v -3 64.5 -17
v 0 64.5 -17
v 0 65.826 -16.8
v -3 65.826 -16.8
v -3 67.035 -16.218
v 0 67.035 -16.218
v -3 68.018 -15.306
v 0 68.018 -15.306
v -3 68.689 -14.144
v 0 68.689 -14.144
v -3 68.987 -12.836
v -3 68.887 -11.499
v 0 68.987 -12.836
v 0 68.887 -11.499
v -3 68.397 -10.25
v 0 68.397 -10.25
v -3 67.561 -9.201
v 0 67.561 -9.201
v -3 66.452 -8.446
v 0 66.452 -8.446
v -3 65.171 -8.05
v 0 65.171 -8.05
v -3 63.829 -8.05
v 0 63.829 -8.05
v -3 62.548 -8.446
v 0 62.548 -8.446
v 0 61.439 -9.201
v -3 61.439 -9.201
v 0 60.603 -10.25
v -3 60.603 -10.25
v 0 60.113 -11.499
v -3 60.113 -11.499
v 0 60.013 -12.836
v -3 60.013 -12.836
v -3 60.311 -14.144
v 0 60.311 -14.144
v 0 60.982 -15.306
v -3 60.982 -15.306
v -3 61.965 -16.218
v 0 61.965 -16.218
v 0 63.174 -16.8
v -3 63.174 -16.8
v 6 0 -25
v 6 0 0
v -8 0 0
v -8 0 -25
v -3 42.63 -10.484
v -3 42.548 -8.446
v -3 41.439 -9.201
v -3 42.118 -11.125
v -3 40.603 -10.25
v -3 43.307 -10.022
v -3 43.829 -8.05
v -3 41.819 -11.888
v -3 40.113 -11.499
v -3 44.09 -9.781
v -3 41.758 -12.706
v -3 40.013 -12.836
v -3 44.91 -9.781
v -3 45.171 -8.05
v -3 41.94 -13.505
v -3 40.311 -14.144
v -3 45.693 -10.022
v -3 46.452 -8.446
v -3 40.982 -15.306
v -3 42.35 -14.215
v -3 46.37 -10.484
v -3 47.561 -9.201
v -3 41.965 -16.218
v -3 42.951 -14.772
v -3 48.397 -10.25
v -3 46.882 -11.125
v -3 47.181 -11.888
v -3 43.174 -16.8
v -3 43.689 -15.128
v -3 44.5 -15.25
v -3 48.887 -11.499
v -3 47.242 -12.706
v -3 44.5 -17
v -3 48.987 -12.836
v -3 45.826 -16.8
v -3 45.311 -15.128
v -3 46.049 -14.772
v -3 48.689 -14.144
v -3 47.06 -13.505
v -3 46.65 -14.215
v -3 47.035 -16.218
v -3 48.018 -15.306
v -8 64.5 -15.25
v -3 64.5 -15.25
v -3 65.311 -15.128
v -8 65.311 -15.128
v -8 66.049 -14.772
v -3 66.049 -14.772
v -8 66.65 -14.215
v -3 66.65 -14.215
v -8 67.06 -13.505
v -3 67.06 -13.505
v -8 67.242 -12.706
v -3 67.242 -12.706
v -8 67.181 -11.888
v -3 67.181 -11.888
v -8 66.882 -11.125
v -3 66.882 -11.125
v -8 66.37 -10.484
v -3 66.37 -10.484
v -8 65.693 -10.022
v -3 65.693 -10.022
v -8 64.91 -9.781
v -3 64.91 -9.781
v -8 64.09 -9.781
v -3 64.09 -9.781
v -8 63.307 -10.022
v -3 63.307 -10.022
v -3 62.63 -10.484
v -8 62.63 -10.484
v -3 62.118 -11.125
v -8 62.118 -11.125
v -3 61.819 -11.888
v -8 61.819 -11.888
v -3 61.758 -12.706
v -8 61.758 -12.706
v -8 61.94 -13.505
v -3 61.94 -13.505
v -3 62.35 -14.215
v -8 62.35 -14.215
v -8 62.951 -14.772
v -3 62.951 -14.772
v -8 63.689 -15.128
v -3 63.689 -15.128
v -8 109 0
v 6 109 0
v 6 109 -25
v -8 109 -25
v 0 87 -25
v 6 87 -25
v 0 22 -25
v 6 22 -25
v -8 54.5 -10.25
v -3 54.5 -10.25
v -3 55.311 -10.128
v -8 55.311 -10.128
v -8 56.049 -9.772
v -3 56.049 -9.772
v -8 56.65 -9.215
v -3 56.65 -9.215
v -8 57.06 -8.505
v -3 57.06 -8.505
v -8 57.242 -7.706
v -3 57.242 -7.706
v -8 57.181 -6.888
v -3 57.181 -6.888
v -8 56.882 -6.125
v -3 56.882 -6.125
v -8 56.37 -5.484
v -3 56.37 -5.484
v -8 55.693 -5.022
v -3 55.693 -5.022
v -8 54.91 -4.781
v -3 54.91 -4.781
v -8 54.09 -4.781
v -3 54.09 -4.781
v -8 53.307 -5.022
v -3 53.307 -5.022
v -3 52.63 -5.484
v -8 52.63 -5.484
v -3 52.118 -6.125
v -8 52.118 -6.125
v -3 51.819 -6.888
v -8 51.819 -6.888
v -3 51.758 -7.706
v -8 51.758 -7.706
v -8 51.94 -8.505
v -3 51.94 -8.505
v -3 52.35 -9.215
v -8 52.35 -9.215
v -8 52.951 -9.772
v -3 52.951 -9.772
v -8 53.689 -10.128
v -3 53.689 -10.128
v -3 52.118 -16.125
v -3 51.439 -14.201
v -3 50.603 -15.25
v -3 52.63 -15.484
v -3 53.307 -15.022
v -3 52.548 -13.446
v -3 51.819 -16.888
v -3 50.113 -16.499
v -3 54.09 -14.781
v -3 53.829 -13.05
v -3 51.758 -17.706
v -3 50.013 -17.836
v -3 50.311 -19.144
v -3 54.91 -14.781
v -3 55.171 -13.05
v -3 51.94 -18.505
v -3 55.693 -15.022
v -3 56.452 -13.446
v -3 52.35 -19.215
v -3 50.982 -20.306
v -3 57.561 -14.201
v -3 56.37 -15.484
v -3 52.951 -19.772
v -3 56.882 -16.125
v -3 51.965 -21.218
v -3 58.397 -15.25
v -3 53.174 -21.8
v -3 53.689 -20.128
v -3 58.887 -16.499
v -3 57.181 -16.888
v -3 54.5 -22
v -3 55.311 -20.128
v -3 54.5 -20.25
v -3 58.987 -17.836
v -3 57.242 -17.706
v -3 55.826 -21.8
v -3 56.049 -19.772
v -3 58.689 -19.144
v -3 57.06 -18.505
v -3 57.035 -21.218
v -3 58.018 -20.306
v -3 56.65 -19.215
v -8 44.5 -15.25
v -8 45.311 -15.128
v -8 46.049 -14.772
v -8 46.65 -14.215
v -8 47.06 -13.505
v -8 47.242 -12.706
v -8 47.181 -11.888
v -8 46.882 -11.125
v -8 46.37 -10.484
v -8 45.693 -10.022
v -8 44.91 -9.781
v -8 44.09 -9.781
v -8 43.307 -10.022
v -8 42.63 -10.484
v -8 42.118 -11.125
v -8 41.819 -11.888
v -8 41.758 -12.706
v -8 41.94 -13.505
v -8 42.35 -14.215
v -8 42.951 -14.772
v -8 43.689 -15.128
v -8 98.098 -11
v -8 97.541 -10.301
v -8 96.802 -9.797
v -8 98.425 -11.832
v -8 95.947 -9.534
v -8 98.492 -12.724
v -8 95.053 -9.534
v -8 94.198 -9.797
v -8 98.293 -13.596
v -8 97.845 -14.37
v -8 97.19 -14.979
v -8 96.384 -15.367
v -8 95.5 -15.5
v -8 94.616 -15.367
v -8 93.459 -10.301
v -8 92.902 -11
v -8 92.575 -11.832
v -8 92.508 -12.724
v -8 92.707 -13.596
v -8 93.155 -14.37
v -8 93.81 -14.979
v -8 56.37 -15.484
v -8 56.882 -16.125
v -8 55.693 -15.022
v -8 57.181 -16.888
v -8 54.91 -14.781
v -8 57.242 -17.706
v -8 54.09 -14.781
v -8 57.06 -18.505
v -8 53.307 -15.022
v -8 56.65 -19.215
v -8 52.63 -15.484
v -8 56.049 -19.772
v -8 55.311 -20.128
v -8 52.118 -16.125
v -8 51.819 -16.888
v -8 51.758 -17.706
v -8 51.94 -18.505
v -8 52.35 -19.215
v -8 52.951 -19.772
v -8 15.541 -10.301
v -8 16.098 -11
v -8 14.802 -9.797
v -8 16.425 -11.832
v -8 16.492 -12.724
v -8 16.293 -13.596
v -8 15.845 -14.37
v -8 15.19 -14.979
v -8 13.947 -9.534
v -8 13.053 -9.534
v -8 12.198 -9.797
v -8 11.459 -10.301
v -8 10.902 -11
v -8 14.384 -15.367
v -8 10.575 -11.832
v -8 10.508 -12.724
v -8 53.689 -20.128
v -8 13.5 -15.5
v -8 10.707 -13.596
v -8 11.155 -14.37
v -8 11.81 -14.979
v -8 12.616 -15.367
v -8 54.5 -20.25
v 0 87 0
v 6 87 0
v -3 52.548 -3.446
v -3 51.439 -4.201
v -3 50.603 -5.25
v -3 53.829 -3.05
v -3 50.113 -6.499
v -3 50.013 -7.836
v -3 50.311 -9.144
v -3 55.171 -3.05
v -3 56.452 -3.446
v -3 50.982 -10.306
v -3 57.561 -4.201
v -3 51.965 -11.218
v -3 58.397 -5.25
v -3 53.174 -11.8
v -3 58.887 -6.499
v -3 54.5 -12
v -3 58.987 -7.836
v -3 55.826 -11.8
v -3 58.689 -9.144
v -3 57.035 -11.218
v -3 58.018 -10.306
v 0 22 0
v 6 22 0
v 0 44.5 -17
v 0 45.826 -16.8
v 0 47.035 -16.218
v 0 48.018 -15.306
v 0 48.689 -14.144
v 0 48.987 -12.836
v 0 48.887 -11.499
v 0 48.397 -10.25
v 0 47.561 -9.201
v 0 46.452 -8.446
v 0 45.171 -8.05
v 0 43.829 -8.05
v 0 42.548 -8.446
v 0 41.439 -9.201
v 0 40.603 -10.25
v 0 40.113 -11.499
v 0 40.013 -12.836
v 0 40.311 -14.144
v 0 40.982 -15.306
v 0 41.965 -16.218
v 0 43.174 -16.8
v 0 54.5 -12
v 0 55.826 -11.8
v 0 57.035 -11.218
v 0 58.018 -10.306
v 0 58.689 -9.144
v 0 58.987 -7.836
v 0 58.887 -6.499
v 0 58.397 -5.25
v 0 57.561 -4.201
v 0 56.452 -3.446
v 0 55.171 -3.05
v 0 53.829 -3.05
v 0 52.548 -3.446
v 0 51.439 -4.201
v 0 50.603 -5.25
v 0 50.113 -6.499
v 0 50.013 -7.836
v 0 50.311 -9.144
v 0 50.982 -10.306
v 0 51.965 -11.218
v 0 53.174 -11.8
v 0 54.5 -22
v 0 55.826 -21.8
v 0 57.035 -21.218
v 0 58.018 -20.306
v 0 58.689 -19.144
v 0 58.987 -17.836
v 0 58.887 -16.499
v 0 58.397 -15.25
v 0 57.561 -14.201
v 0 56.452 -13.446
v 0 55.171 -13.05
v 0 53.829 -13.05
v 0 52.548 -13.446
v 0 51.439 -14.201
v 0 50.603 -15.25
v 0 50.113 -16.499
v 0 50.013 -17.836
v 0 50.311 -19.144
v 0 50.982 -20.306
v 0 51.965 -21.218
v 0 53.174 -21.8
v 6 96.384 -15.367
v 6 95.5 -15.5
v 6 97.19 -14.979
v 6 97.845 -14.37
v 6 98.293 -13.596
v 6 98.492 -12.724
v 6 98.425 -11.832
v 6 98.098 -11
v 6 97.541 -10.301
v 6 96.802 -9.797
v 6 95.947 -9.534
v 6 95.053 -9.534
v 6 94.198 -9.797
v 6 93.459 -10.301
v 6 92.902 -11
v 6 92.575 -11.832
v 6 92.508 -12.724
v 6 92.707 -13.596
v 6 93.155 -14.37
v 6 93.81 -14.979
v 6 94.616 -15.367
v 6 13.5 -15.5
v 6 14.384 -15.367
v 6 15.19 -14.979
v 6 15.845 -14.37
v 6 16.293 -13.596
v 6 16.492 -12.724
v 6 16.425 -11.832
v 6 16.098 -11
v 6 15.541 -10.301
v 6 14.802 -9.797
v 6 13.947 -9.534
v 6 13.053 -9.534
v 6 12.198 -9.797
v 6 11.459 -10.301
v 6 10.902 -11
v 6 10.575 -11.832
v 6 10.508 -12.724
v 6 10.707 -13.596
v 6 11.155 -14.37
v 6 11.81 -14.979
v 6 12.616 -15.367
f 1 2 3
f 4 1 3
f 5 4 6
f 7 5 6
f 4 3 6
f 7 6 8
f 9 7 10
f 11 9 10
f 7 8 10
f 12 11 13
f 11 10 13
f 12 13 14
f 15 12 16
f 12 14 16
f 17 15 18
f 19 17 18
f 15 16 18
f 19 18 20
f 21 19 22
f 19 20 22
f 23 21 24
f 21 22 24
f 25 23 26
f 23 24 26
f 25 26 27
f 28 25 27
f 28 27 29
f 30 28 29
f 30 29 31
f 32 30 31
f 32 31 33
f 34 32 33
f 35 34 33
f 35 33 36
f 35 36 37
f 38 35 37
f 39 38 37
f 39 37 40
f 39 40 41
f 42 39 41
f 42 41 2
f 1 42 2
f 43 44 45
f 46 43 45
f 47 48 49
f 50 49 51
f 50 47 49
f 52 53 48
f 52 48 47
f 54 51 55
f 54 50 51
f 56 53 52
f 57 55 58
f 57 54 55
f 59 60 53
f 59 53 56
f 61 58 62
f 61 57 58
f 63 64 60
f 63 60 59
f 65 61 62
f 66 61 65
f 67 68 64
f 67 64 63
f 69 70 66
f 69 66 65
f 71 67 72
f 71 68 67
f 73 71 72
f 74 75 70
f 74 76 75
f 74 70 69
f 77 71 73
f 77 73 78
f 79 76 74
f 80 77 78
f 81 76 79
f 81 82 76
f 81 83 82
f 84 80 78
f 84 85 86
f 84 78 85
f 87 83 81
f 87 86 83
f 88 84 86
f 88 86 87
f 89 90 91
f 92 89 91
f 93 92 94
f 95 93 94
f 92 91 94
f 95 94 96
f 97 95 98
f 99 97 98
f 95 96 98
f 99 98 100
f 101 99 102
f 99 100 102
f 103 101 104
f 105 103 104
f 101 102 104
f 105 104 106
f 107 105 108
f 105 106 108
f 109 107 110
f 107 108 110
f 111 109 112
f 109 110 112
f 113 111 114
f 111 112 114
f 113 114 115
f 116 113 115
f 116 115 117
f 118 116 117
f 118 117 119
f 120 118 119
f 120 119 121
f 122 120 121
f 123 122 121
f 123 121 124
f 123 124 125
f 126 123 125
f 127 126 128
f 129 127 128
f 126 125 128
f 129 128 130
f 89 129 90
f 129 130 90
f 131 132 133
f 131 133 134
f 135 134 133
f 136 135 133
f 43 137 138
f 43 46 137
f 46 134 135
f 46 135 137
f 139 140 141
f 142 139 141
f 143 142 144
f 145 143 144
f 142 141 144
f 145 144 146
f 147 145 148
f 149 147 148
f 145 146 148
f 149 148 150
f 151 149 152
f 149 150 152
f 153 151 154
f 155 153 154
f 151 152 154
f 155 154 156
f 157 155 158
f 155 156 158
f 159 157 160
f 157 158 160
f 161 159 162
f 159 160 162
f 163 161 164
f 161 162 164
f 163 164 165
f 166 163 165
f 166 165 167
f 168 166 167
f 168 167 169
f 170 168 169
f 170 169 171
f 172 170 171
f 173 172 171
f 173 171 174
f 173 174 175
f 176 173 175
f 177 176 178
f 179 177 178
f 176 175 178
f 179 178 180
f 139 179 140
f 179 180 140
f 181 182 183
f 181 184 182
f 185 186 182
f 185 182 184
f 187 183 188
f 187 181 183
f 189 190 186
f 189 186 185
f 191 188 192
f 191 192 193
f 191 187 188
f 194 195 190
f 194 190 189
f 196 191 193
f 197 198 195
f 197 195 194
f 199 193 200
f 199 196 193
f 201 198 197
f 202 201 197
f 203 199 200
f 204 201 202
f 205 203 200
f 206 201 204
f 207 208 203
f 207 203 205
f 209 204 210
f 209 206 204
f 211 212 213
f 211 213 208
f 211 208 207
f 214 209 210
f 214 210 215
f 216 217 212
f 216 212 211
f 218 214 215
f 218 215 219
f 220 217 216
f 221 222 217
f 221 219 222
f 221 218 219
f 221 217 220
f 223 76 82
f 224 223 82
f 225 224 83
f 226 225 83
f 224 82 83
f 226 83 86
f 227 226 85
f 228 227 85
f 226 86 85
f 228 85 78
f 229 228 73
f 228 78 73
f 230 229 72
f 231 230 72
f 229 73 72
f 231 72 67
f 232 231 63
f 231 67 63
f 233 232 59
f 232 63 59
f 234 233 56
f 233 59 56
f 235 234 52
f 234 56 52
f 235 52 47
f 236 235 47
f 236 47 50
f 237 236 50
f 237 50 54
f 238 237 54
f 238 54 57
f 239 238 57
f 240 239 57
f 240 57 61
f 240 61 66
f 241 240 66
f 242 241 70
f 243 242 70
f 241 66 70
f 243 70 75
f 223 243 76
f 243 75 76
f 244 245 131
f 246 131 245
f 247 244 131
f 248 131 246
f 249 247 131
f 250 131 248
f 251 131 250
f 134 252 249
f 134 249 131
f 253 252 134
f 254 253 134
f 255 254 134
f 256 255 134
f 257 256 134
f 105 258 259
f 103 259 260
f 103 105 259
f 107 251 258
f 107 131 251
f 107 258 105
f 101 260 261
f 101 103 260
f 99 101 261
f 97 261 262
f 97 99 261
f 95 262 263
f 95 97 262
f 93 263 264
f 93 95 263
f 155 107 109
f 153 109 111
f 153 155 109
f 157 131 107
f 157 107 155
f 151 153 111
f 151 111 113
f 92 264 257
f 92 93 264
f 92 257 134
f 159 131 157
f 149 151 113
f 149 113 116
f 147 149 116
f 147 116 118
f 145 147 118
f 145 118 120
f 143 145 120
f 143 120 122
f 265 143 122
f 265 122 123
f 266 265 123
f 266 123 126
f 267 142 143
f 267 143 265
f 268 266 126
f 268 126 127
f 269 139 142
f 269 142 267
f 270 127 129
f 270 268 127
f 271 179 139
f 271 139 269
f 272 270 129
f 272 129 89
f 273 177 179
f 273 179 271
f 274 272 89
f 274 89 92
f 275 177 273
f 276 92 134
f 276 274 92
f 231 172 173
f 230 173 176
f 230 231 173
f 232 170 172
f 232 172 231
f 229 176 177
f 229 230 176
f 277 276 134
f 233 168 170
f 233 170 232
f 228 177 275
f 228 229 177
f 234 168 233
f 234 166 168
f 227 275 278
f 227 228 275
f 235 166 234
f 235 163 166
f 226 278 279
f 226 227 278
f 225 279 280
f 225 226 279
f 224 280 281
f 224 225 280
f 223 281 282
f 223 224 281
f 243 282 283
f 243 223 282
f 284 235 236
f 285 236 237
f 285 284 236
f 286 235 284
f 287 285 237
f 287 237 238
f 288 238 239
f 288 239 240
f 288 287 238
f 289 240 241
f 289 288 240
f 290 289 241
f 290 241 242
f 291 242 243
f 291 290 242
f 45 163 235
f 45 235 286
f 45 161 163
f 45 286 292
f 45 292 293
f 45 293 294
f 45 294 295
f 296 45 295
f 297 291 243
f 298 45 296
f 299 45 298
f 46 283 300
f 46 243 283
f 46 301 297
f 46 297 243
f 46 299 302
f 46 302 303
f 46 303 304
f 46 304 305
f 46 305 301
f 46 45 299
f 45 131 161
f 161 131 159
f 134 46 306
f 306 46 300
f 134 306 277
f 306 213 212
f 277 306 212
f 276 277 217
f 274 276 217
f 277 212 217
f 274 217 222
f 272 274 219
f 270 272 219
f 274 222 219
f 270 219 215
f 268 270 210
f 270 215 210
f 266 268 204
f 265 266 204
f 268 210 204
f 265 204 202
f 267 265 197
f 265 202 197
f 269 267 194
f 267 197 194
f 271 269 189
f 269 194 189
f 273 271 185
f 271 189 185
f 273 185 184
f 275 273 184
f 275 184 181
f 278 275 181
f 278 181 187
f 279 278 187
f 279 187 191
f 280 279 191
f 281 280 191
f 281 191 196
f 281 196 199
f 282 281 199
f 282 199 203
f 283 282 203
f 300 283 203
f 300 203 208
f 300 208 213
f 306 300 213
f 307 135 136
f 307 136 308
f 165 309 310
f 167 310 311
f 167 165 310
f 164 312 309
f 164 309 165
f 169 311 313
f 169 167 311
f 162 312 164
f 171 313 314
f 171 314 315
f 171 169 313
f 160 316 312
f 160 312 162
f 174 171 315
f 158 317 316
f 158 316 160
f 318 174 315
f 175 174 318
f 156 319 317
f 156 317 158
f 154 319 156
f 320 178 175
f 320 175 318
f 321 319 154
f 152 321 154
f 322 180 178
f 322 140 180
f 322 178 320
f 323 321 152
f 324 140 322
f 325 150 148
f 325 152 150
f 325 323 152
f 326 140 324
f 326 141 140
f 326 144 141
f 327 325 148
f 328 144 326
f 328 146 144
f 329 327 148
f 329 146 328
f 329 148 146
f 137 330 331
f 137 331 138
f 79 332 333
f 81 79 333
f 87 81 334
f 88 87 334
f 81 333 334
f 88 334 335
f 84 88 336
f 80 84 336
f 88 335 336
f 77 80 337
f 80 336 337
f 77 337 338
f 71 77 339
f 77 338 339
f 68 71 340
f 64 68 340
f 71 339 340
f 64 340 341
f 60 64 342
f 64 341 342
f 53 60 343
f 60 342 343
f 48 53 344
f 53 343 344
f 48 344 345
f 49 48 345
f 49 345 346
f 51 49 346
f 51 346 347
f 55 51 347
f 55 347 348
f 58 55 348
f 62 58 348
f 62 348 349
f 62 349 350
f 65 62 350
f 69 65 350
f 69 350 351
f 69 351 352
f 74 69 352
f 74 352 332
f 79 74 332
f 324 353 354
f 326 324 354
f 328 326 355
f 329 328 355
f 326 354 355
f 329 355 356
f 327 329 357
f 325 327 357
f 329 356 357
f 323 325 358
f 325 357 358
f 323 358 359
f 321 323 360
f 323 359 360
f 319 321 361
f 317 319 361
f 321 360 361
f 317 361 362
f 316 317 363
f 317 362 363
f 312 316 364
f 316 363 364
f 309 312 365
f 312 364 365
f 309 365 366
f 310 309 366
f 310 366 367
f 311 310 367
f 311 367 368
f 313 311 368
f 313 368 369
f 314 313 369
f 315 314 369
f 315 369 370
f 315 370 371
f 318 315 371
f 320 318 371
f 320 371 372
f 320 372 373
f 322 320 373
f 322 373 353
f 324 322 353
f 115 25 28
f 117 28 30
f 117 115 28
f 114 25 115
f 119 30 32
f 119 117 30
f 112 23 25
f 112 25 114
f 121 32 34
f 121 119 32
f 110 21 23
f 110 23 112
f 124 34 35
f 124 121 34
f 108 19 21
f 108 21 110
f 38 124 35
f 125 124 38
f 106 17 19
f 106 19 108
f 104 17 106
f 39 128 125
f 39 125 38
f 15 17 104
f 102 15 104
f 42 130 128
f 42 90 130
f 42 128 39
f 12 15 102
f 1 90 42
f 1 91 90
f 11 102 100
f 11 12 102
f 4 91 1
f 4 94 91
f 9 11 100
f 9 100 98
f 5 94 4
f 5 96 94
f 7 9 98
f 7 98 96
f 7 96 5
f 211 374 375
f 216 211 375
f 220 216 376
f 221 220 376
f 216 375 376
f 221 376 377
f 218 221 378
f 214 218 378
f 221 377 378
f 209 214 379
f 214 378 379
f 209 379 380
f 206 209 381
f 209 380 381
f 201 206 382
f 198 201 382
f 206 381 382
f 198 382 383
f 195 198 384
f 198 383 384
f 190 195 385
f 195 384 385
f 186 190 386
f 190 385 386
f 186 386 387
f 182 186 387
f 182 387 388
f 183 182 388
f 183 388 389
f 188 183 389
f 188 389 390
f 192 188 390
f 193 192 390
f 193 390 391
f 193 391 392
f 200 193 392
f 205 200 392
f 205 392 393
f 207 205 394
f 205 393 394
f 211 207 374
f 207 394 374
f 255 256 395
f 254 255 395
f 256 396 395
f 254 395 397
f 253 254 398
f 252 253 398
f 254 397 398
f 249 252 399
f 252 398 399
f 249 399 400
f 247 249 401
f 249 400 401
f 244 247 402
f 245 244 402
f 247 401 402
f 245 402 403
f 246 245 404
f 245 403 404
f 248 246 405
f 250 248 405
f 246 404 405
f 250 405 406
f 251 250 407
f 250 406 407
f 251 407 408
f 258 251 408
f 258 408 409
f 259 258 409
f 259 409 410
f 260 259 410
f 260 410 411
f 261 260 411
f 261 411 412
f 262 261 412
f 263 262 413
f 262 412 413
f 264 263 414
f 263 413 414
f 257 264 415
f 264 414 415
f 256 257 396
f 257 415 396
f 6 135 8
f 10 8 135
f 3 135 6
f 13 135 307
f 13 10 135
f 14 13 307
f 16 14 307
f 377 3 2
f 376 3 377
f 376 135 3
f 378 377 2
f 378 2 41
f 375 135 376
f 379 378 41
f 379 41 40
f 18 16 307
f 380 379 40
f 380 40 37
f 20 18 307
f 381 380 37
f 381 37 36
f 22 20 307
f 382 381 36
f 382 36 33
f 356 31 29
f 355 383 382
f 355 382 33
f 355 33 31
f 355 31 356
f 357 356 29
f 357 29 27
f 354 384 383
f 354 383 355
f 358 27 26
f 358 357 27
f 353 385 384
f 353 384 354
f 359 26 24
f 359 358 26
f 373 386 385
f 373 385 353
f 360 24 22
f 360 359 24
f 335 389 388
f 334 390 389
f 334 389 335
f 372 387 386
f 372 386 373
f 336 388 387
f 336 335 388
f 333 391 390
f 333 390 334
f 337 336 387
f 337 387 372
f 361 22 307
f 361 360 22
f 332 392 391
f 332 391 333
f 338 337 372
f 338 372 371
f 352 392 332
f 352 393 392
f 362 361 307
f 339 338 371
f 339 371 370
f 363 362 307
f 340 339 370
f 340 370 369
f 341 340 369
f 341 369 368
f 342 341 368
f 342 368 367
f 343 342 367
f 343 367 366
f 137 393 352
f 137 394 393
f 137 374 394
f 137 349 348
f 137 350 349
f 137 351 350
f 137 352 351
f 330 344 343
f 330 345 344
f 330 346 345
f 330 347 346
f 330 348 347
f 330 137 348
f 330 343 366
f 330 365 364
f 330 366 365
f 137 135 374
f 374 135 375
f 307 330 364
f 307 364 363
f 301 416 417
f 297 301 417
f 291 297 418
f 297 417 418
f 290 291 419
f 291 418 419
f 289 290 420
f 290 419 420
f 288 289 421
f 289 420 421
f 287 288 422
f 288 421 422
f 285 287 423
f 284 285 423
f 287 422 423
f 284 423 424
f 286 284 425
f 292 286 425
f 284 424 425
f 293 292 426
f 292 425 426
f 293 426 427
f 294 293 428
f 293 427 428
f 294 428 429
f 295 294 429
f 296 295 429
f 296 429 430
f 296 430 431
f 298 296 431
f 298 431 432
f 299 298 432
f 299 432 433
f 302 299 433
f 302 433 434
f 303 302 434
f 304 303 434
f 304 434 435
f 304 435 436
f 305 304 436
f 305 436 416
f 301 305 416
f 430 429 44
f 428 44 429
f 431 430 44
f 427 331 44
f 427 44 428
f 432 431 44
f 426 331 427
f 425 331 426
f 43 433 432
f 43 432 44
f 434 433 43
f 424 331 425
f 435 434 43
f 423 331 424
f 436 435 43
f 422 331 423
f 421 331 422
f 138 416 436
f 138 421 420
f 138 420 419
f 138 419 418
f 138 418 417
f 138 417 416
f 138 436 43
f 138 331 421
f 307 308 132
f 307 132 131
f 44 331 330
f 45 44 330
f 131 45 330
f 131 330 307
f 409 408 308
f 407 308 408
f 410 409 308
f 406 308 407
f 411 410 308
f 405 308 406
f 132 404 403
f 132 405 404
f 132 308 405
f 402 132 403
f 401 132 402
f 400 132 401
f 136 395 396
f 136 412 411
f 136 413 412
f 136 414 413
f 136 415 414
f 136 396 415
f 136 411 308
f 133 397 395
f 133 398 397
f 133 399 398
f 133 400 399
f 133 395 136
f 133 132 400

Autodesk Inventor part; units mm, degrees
ref_plane "YZ Plane" through (0, 0, 0) normal (1, 0, 0) x (0, 1, 0)
ref_plane "XZ Plane" through (0, 0, 0) normal (0, 1, 0) x (-1, 0, 0)
ref_plane "XY Plane" through (0, 0, 0) normal (0, 0, 1) x (1, 0, 0)
sketch "Sketch1" plane through (0, 0, 0) normal (0, 1, 0) x (-1, 0, 0)
  line L0 (0, 0) -> (8, 0)
  line L1 (8, 0) -> (8, -25)
  line L2 (8, -25) -> (0, -25)
  line L3 (0, -25) -> (0, 0)
  dimension "d0" = 8
  dimension "d1" = 25
extrude "Extrusion1" add sketch "Sketch1" along normal blind 109
sketch "Sketch2" plane through (0, 0, 0) normal (1, 0, 0) x (0, 0, -1)
  line L0 (0, 109) -> (25, 109) projected
  line L1 (0, 109) -> (25, 109)
  line L2 (25, 109) -> (25, 87)
  line L3 (25, 87) -> (0, 87)
  line L4 (0, 87) -> (0, 109)
  line L5 (25, 0) -> (25, 109) projected
  line L6 (25, 0) -> (0, 0)
  line L7 (0, 0) -> (0, 22)
  line L8 (0, 22) -> (25, 22)
  line L9 (25, 22) -> (25, 0)
  dimension "d4" = 25
  dimension "d5" = 22
  dimension "d6" = 25
  dimension "d7" = 22
extrude "Extrusion2" add sketch "Sketch2" along normal blind 6
sketch "Sketch3" plane through (6, 0, 0) normal (1, 0, 0) x (0, 0, -1)
  line L0 (0, 0) -> (25, 0) projected
  line L1 (0, 0) -> (12.5, 0)
  line L2 (12.5, 0) -> (12.5, 13.5)
  circle A0 centre (12.5, 13.5) radius 3
  circle A1 centre (12.5, 95.5) radius 3
  line L3 (25, 109) -> (0, 109) projected
  line L4 (0, 109) -> (0, 87) projected
  dimension "d10" = 13.5
  dimension "d11" = 6
  dimension "d12" = 6
  dimension "d13" = 13.5
  dimension "d14" = 12.5
sketch "Sketch4" plane through (0, 22, -25) normal (1, 0, 0) x (0, 0, -1)
  circle A0 centre (-17.5, 32.5) radius 2.75
  line L0 (-25, -22) -> (0, -22) projected
  line L1 (-25, 0) -> (-25, 65) projected
  circle A1 centre (-7.5, 32.5) radius 2.75
  line L2 (0, 0) -> (0, 65) projected
  circle A2 centre (-12.5, 22.5) radius 2.75
  circle A3 centre (-12.5, 42.5) radius 2.75
  dimension "d15" = 5.5
  dimension "d16" = 54.5
  dimension "d17" = 7.5
  dimension "d18" = 5.5
  dimension "d19" = 7.5
  dimension "d20" = 54.5
  dimension "d21" = 5.5
  dimension "d22" = 5.5
  dimension "d23" = 10
  dimension "d24" = 5
  dimension "d25" = 10
  dimension "d26" = 5
extrude "Extrusion3" cut sketch "Sketch3" against normal up to next
extrude "Extrusion4" cut sketch "Sketch4" against normal up to next
sketch "Sketch5" plane through (0, 22, -25) normal (1, 0, 0) x (0, 0, -1)
  circle A0 centre (-12.5, 42.5) radius 2.75 projected
  circle A1 centre (-12.5, 42.5) radius 4.5
  circle A2 centre (-17.5, 32.5) radius 2.75 projected
  circle A3 centre (-17.5, 32.5) radius 4.5
  circle A4 centre (-7.5, 32.5) radius 2.75 projected
  circle A5 centre (-7.5, 32.5) radius 4.5
  circle A6 centre (-12.5, 22.5) radius 2.75 projected
  circle A7 centre (-12.5, 22.5) radius 4.5
  point P0 (-25, -22)
  dimension "d31" = 9
  dimension "d32" = 9
  dimension "d33" = 9
  dimension "d34" = 9
extrude "Extrusion5" cut sketch "Sketch5" against normal blind 3
properties part number "Back_Bracket" material "ABS Plastic"
